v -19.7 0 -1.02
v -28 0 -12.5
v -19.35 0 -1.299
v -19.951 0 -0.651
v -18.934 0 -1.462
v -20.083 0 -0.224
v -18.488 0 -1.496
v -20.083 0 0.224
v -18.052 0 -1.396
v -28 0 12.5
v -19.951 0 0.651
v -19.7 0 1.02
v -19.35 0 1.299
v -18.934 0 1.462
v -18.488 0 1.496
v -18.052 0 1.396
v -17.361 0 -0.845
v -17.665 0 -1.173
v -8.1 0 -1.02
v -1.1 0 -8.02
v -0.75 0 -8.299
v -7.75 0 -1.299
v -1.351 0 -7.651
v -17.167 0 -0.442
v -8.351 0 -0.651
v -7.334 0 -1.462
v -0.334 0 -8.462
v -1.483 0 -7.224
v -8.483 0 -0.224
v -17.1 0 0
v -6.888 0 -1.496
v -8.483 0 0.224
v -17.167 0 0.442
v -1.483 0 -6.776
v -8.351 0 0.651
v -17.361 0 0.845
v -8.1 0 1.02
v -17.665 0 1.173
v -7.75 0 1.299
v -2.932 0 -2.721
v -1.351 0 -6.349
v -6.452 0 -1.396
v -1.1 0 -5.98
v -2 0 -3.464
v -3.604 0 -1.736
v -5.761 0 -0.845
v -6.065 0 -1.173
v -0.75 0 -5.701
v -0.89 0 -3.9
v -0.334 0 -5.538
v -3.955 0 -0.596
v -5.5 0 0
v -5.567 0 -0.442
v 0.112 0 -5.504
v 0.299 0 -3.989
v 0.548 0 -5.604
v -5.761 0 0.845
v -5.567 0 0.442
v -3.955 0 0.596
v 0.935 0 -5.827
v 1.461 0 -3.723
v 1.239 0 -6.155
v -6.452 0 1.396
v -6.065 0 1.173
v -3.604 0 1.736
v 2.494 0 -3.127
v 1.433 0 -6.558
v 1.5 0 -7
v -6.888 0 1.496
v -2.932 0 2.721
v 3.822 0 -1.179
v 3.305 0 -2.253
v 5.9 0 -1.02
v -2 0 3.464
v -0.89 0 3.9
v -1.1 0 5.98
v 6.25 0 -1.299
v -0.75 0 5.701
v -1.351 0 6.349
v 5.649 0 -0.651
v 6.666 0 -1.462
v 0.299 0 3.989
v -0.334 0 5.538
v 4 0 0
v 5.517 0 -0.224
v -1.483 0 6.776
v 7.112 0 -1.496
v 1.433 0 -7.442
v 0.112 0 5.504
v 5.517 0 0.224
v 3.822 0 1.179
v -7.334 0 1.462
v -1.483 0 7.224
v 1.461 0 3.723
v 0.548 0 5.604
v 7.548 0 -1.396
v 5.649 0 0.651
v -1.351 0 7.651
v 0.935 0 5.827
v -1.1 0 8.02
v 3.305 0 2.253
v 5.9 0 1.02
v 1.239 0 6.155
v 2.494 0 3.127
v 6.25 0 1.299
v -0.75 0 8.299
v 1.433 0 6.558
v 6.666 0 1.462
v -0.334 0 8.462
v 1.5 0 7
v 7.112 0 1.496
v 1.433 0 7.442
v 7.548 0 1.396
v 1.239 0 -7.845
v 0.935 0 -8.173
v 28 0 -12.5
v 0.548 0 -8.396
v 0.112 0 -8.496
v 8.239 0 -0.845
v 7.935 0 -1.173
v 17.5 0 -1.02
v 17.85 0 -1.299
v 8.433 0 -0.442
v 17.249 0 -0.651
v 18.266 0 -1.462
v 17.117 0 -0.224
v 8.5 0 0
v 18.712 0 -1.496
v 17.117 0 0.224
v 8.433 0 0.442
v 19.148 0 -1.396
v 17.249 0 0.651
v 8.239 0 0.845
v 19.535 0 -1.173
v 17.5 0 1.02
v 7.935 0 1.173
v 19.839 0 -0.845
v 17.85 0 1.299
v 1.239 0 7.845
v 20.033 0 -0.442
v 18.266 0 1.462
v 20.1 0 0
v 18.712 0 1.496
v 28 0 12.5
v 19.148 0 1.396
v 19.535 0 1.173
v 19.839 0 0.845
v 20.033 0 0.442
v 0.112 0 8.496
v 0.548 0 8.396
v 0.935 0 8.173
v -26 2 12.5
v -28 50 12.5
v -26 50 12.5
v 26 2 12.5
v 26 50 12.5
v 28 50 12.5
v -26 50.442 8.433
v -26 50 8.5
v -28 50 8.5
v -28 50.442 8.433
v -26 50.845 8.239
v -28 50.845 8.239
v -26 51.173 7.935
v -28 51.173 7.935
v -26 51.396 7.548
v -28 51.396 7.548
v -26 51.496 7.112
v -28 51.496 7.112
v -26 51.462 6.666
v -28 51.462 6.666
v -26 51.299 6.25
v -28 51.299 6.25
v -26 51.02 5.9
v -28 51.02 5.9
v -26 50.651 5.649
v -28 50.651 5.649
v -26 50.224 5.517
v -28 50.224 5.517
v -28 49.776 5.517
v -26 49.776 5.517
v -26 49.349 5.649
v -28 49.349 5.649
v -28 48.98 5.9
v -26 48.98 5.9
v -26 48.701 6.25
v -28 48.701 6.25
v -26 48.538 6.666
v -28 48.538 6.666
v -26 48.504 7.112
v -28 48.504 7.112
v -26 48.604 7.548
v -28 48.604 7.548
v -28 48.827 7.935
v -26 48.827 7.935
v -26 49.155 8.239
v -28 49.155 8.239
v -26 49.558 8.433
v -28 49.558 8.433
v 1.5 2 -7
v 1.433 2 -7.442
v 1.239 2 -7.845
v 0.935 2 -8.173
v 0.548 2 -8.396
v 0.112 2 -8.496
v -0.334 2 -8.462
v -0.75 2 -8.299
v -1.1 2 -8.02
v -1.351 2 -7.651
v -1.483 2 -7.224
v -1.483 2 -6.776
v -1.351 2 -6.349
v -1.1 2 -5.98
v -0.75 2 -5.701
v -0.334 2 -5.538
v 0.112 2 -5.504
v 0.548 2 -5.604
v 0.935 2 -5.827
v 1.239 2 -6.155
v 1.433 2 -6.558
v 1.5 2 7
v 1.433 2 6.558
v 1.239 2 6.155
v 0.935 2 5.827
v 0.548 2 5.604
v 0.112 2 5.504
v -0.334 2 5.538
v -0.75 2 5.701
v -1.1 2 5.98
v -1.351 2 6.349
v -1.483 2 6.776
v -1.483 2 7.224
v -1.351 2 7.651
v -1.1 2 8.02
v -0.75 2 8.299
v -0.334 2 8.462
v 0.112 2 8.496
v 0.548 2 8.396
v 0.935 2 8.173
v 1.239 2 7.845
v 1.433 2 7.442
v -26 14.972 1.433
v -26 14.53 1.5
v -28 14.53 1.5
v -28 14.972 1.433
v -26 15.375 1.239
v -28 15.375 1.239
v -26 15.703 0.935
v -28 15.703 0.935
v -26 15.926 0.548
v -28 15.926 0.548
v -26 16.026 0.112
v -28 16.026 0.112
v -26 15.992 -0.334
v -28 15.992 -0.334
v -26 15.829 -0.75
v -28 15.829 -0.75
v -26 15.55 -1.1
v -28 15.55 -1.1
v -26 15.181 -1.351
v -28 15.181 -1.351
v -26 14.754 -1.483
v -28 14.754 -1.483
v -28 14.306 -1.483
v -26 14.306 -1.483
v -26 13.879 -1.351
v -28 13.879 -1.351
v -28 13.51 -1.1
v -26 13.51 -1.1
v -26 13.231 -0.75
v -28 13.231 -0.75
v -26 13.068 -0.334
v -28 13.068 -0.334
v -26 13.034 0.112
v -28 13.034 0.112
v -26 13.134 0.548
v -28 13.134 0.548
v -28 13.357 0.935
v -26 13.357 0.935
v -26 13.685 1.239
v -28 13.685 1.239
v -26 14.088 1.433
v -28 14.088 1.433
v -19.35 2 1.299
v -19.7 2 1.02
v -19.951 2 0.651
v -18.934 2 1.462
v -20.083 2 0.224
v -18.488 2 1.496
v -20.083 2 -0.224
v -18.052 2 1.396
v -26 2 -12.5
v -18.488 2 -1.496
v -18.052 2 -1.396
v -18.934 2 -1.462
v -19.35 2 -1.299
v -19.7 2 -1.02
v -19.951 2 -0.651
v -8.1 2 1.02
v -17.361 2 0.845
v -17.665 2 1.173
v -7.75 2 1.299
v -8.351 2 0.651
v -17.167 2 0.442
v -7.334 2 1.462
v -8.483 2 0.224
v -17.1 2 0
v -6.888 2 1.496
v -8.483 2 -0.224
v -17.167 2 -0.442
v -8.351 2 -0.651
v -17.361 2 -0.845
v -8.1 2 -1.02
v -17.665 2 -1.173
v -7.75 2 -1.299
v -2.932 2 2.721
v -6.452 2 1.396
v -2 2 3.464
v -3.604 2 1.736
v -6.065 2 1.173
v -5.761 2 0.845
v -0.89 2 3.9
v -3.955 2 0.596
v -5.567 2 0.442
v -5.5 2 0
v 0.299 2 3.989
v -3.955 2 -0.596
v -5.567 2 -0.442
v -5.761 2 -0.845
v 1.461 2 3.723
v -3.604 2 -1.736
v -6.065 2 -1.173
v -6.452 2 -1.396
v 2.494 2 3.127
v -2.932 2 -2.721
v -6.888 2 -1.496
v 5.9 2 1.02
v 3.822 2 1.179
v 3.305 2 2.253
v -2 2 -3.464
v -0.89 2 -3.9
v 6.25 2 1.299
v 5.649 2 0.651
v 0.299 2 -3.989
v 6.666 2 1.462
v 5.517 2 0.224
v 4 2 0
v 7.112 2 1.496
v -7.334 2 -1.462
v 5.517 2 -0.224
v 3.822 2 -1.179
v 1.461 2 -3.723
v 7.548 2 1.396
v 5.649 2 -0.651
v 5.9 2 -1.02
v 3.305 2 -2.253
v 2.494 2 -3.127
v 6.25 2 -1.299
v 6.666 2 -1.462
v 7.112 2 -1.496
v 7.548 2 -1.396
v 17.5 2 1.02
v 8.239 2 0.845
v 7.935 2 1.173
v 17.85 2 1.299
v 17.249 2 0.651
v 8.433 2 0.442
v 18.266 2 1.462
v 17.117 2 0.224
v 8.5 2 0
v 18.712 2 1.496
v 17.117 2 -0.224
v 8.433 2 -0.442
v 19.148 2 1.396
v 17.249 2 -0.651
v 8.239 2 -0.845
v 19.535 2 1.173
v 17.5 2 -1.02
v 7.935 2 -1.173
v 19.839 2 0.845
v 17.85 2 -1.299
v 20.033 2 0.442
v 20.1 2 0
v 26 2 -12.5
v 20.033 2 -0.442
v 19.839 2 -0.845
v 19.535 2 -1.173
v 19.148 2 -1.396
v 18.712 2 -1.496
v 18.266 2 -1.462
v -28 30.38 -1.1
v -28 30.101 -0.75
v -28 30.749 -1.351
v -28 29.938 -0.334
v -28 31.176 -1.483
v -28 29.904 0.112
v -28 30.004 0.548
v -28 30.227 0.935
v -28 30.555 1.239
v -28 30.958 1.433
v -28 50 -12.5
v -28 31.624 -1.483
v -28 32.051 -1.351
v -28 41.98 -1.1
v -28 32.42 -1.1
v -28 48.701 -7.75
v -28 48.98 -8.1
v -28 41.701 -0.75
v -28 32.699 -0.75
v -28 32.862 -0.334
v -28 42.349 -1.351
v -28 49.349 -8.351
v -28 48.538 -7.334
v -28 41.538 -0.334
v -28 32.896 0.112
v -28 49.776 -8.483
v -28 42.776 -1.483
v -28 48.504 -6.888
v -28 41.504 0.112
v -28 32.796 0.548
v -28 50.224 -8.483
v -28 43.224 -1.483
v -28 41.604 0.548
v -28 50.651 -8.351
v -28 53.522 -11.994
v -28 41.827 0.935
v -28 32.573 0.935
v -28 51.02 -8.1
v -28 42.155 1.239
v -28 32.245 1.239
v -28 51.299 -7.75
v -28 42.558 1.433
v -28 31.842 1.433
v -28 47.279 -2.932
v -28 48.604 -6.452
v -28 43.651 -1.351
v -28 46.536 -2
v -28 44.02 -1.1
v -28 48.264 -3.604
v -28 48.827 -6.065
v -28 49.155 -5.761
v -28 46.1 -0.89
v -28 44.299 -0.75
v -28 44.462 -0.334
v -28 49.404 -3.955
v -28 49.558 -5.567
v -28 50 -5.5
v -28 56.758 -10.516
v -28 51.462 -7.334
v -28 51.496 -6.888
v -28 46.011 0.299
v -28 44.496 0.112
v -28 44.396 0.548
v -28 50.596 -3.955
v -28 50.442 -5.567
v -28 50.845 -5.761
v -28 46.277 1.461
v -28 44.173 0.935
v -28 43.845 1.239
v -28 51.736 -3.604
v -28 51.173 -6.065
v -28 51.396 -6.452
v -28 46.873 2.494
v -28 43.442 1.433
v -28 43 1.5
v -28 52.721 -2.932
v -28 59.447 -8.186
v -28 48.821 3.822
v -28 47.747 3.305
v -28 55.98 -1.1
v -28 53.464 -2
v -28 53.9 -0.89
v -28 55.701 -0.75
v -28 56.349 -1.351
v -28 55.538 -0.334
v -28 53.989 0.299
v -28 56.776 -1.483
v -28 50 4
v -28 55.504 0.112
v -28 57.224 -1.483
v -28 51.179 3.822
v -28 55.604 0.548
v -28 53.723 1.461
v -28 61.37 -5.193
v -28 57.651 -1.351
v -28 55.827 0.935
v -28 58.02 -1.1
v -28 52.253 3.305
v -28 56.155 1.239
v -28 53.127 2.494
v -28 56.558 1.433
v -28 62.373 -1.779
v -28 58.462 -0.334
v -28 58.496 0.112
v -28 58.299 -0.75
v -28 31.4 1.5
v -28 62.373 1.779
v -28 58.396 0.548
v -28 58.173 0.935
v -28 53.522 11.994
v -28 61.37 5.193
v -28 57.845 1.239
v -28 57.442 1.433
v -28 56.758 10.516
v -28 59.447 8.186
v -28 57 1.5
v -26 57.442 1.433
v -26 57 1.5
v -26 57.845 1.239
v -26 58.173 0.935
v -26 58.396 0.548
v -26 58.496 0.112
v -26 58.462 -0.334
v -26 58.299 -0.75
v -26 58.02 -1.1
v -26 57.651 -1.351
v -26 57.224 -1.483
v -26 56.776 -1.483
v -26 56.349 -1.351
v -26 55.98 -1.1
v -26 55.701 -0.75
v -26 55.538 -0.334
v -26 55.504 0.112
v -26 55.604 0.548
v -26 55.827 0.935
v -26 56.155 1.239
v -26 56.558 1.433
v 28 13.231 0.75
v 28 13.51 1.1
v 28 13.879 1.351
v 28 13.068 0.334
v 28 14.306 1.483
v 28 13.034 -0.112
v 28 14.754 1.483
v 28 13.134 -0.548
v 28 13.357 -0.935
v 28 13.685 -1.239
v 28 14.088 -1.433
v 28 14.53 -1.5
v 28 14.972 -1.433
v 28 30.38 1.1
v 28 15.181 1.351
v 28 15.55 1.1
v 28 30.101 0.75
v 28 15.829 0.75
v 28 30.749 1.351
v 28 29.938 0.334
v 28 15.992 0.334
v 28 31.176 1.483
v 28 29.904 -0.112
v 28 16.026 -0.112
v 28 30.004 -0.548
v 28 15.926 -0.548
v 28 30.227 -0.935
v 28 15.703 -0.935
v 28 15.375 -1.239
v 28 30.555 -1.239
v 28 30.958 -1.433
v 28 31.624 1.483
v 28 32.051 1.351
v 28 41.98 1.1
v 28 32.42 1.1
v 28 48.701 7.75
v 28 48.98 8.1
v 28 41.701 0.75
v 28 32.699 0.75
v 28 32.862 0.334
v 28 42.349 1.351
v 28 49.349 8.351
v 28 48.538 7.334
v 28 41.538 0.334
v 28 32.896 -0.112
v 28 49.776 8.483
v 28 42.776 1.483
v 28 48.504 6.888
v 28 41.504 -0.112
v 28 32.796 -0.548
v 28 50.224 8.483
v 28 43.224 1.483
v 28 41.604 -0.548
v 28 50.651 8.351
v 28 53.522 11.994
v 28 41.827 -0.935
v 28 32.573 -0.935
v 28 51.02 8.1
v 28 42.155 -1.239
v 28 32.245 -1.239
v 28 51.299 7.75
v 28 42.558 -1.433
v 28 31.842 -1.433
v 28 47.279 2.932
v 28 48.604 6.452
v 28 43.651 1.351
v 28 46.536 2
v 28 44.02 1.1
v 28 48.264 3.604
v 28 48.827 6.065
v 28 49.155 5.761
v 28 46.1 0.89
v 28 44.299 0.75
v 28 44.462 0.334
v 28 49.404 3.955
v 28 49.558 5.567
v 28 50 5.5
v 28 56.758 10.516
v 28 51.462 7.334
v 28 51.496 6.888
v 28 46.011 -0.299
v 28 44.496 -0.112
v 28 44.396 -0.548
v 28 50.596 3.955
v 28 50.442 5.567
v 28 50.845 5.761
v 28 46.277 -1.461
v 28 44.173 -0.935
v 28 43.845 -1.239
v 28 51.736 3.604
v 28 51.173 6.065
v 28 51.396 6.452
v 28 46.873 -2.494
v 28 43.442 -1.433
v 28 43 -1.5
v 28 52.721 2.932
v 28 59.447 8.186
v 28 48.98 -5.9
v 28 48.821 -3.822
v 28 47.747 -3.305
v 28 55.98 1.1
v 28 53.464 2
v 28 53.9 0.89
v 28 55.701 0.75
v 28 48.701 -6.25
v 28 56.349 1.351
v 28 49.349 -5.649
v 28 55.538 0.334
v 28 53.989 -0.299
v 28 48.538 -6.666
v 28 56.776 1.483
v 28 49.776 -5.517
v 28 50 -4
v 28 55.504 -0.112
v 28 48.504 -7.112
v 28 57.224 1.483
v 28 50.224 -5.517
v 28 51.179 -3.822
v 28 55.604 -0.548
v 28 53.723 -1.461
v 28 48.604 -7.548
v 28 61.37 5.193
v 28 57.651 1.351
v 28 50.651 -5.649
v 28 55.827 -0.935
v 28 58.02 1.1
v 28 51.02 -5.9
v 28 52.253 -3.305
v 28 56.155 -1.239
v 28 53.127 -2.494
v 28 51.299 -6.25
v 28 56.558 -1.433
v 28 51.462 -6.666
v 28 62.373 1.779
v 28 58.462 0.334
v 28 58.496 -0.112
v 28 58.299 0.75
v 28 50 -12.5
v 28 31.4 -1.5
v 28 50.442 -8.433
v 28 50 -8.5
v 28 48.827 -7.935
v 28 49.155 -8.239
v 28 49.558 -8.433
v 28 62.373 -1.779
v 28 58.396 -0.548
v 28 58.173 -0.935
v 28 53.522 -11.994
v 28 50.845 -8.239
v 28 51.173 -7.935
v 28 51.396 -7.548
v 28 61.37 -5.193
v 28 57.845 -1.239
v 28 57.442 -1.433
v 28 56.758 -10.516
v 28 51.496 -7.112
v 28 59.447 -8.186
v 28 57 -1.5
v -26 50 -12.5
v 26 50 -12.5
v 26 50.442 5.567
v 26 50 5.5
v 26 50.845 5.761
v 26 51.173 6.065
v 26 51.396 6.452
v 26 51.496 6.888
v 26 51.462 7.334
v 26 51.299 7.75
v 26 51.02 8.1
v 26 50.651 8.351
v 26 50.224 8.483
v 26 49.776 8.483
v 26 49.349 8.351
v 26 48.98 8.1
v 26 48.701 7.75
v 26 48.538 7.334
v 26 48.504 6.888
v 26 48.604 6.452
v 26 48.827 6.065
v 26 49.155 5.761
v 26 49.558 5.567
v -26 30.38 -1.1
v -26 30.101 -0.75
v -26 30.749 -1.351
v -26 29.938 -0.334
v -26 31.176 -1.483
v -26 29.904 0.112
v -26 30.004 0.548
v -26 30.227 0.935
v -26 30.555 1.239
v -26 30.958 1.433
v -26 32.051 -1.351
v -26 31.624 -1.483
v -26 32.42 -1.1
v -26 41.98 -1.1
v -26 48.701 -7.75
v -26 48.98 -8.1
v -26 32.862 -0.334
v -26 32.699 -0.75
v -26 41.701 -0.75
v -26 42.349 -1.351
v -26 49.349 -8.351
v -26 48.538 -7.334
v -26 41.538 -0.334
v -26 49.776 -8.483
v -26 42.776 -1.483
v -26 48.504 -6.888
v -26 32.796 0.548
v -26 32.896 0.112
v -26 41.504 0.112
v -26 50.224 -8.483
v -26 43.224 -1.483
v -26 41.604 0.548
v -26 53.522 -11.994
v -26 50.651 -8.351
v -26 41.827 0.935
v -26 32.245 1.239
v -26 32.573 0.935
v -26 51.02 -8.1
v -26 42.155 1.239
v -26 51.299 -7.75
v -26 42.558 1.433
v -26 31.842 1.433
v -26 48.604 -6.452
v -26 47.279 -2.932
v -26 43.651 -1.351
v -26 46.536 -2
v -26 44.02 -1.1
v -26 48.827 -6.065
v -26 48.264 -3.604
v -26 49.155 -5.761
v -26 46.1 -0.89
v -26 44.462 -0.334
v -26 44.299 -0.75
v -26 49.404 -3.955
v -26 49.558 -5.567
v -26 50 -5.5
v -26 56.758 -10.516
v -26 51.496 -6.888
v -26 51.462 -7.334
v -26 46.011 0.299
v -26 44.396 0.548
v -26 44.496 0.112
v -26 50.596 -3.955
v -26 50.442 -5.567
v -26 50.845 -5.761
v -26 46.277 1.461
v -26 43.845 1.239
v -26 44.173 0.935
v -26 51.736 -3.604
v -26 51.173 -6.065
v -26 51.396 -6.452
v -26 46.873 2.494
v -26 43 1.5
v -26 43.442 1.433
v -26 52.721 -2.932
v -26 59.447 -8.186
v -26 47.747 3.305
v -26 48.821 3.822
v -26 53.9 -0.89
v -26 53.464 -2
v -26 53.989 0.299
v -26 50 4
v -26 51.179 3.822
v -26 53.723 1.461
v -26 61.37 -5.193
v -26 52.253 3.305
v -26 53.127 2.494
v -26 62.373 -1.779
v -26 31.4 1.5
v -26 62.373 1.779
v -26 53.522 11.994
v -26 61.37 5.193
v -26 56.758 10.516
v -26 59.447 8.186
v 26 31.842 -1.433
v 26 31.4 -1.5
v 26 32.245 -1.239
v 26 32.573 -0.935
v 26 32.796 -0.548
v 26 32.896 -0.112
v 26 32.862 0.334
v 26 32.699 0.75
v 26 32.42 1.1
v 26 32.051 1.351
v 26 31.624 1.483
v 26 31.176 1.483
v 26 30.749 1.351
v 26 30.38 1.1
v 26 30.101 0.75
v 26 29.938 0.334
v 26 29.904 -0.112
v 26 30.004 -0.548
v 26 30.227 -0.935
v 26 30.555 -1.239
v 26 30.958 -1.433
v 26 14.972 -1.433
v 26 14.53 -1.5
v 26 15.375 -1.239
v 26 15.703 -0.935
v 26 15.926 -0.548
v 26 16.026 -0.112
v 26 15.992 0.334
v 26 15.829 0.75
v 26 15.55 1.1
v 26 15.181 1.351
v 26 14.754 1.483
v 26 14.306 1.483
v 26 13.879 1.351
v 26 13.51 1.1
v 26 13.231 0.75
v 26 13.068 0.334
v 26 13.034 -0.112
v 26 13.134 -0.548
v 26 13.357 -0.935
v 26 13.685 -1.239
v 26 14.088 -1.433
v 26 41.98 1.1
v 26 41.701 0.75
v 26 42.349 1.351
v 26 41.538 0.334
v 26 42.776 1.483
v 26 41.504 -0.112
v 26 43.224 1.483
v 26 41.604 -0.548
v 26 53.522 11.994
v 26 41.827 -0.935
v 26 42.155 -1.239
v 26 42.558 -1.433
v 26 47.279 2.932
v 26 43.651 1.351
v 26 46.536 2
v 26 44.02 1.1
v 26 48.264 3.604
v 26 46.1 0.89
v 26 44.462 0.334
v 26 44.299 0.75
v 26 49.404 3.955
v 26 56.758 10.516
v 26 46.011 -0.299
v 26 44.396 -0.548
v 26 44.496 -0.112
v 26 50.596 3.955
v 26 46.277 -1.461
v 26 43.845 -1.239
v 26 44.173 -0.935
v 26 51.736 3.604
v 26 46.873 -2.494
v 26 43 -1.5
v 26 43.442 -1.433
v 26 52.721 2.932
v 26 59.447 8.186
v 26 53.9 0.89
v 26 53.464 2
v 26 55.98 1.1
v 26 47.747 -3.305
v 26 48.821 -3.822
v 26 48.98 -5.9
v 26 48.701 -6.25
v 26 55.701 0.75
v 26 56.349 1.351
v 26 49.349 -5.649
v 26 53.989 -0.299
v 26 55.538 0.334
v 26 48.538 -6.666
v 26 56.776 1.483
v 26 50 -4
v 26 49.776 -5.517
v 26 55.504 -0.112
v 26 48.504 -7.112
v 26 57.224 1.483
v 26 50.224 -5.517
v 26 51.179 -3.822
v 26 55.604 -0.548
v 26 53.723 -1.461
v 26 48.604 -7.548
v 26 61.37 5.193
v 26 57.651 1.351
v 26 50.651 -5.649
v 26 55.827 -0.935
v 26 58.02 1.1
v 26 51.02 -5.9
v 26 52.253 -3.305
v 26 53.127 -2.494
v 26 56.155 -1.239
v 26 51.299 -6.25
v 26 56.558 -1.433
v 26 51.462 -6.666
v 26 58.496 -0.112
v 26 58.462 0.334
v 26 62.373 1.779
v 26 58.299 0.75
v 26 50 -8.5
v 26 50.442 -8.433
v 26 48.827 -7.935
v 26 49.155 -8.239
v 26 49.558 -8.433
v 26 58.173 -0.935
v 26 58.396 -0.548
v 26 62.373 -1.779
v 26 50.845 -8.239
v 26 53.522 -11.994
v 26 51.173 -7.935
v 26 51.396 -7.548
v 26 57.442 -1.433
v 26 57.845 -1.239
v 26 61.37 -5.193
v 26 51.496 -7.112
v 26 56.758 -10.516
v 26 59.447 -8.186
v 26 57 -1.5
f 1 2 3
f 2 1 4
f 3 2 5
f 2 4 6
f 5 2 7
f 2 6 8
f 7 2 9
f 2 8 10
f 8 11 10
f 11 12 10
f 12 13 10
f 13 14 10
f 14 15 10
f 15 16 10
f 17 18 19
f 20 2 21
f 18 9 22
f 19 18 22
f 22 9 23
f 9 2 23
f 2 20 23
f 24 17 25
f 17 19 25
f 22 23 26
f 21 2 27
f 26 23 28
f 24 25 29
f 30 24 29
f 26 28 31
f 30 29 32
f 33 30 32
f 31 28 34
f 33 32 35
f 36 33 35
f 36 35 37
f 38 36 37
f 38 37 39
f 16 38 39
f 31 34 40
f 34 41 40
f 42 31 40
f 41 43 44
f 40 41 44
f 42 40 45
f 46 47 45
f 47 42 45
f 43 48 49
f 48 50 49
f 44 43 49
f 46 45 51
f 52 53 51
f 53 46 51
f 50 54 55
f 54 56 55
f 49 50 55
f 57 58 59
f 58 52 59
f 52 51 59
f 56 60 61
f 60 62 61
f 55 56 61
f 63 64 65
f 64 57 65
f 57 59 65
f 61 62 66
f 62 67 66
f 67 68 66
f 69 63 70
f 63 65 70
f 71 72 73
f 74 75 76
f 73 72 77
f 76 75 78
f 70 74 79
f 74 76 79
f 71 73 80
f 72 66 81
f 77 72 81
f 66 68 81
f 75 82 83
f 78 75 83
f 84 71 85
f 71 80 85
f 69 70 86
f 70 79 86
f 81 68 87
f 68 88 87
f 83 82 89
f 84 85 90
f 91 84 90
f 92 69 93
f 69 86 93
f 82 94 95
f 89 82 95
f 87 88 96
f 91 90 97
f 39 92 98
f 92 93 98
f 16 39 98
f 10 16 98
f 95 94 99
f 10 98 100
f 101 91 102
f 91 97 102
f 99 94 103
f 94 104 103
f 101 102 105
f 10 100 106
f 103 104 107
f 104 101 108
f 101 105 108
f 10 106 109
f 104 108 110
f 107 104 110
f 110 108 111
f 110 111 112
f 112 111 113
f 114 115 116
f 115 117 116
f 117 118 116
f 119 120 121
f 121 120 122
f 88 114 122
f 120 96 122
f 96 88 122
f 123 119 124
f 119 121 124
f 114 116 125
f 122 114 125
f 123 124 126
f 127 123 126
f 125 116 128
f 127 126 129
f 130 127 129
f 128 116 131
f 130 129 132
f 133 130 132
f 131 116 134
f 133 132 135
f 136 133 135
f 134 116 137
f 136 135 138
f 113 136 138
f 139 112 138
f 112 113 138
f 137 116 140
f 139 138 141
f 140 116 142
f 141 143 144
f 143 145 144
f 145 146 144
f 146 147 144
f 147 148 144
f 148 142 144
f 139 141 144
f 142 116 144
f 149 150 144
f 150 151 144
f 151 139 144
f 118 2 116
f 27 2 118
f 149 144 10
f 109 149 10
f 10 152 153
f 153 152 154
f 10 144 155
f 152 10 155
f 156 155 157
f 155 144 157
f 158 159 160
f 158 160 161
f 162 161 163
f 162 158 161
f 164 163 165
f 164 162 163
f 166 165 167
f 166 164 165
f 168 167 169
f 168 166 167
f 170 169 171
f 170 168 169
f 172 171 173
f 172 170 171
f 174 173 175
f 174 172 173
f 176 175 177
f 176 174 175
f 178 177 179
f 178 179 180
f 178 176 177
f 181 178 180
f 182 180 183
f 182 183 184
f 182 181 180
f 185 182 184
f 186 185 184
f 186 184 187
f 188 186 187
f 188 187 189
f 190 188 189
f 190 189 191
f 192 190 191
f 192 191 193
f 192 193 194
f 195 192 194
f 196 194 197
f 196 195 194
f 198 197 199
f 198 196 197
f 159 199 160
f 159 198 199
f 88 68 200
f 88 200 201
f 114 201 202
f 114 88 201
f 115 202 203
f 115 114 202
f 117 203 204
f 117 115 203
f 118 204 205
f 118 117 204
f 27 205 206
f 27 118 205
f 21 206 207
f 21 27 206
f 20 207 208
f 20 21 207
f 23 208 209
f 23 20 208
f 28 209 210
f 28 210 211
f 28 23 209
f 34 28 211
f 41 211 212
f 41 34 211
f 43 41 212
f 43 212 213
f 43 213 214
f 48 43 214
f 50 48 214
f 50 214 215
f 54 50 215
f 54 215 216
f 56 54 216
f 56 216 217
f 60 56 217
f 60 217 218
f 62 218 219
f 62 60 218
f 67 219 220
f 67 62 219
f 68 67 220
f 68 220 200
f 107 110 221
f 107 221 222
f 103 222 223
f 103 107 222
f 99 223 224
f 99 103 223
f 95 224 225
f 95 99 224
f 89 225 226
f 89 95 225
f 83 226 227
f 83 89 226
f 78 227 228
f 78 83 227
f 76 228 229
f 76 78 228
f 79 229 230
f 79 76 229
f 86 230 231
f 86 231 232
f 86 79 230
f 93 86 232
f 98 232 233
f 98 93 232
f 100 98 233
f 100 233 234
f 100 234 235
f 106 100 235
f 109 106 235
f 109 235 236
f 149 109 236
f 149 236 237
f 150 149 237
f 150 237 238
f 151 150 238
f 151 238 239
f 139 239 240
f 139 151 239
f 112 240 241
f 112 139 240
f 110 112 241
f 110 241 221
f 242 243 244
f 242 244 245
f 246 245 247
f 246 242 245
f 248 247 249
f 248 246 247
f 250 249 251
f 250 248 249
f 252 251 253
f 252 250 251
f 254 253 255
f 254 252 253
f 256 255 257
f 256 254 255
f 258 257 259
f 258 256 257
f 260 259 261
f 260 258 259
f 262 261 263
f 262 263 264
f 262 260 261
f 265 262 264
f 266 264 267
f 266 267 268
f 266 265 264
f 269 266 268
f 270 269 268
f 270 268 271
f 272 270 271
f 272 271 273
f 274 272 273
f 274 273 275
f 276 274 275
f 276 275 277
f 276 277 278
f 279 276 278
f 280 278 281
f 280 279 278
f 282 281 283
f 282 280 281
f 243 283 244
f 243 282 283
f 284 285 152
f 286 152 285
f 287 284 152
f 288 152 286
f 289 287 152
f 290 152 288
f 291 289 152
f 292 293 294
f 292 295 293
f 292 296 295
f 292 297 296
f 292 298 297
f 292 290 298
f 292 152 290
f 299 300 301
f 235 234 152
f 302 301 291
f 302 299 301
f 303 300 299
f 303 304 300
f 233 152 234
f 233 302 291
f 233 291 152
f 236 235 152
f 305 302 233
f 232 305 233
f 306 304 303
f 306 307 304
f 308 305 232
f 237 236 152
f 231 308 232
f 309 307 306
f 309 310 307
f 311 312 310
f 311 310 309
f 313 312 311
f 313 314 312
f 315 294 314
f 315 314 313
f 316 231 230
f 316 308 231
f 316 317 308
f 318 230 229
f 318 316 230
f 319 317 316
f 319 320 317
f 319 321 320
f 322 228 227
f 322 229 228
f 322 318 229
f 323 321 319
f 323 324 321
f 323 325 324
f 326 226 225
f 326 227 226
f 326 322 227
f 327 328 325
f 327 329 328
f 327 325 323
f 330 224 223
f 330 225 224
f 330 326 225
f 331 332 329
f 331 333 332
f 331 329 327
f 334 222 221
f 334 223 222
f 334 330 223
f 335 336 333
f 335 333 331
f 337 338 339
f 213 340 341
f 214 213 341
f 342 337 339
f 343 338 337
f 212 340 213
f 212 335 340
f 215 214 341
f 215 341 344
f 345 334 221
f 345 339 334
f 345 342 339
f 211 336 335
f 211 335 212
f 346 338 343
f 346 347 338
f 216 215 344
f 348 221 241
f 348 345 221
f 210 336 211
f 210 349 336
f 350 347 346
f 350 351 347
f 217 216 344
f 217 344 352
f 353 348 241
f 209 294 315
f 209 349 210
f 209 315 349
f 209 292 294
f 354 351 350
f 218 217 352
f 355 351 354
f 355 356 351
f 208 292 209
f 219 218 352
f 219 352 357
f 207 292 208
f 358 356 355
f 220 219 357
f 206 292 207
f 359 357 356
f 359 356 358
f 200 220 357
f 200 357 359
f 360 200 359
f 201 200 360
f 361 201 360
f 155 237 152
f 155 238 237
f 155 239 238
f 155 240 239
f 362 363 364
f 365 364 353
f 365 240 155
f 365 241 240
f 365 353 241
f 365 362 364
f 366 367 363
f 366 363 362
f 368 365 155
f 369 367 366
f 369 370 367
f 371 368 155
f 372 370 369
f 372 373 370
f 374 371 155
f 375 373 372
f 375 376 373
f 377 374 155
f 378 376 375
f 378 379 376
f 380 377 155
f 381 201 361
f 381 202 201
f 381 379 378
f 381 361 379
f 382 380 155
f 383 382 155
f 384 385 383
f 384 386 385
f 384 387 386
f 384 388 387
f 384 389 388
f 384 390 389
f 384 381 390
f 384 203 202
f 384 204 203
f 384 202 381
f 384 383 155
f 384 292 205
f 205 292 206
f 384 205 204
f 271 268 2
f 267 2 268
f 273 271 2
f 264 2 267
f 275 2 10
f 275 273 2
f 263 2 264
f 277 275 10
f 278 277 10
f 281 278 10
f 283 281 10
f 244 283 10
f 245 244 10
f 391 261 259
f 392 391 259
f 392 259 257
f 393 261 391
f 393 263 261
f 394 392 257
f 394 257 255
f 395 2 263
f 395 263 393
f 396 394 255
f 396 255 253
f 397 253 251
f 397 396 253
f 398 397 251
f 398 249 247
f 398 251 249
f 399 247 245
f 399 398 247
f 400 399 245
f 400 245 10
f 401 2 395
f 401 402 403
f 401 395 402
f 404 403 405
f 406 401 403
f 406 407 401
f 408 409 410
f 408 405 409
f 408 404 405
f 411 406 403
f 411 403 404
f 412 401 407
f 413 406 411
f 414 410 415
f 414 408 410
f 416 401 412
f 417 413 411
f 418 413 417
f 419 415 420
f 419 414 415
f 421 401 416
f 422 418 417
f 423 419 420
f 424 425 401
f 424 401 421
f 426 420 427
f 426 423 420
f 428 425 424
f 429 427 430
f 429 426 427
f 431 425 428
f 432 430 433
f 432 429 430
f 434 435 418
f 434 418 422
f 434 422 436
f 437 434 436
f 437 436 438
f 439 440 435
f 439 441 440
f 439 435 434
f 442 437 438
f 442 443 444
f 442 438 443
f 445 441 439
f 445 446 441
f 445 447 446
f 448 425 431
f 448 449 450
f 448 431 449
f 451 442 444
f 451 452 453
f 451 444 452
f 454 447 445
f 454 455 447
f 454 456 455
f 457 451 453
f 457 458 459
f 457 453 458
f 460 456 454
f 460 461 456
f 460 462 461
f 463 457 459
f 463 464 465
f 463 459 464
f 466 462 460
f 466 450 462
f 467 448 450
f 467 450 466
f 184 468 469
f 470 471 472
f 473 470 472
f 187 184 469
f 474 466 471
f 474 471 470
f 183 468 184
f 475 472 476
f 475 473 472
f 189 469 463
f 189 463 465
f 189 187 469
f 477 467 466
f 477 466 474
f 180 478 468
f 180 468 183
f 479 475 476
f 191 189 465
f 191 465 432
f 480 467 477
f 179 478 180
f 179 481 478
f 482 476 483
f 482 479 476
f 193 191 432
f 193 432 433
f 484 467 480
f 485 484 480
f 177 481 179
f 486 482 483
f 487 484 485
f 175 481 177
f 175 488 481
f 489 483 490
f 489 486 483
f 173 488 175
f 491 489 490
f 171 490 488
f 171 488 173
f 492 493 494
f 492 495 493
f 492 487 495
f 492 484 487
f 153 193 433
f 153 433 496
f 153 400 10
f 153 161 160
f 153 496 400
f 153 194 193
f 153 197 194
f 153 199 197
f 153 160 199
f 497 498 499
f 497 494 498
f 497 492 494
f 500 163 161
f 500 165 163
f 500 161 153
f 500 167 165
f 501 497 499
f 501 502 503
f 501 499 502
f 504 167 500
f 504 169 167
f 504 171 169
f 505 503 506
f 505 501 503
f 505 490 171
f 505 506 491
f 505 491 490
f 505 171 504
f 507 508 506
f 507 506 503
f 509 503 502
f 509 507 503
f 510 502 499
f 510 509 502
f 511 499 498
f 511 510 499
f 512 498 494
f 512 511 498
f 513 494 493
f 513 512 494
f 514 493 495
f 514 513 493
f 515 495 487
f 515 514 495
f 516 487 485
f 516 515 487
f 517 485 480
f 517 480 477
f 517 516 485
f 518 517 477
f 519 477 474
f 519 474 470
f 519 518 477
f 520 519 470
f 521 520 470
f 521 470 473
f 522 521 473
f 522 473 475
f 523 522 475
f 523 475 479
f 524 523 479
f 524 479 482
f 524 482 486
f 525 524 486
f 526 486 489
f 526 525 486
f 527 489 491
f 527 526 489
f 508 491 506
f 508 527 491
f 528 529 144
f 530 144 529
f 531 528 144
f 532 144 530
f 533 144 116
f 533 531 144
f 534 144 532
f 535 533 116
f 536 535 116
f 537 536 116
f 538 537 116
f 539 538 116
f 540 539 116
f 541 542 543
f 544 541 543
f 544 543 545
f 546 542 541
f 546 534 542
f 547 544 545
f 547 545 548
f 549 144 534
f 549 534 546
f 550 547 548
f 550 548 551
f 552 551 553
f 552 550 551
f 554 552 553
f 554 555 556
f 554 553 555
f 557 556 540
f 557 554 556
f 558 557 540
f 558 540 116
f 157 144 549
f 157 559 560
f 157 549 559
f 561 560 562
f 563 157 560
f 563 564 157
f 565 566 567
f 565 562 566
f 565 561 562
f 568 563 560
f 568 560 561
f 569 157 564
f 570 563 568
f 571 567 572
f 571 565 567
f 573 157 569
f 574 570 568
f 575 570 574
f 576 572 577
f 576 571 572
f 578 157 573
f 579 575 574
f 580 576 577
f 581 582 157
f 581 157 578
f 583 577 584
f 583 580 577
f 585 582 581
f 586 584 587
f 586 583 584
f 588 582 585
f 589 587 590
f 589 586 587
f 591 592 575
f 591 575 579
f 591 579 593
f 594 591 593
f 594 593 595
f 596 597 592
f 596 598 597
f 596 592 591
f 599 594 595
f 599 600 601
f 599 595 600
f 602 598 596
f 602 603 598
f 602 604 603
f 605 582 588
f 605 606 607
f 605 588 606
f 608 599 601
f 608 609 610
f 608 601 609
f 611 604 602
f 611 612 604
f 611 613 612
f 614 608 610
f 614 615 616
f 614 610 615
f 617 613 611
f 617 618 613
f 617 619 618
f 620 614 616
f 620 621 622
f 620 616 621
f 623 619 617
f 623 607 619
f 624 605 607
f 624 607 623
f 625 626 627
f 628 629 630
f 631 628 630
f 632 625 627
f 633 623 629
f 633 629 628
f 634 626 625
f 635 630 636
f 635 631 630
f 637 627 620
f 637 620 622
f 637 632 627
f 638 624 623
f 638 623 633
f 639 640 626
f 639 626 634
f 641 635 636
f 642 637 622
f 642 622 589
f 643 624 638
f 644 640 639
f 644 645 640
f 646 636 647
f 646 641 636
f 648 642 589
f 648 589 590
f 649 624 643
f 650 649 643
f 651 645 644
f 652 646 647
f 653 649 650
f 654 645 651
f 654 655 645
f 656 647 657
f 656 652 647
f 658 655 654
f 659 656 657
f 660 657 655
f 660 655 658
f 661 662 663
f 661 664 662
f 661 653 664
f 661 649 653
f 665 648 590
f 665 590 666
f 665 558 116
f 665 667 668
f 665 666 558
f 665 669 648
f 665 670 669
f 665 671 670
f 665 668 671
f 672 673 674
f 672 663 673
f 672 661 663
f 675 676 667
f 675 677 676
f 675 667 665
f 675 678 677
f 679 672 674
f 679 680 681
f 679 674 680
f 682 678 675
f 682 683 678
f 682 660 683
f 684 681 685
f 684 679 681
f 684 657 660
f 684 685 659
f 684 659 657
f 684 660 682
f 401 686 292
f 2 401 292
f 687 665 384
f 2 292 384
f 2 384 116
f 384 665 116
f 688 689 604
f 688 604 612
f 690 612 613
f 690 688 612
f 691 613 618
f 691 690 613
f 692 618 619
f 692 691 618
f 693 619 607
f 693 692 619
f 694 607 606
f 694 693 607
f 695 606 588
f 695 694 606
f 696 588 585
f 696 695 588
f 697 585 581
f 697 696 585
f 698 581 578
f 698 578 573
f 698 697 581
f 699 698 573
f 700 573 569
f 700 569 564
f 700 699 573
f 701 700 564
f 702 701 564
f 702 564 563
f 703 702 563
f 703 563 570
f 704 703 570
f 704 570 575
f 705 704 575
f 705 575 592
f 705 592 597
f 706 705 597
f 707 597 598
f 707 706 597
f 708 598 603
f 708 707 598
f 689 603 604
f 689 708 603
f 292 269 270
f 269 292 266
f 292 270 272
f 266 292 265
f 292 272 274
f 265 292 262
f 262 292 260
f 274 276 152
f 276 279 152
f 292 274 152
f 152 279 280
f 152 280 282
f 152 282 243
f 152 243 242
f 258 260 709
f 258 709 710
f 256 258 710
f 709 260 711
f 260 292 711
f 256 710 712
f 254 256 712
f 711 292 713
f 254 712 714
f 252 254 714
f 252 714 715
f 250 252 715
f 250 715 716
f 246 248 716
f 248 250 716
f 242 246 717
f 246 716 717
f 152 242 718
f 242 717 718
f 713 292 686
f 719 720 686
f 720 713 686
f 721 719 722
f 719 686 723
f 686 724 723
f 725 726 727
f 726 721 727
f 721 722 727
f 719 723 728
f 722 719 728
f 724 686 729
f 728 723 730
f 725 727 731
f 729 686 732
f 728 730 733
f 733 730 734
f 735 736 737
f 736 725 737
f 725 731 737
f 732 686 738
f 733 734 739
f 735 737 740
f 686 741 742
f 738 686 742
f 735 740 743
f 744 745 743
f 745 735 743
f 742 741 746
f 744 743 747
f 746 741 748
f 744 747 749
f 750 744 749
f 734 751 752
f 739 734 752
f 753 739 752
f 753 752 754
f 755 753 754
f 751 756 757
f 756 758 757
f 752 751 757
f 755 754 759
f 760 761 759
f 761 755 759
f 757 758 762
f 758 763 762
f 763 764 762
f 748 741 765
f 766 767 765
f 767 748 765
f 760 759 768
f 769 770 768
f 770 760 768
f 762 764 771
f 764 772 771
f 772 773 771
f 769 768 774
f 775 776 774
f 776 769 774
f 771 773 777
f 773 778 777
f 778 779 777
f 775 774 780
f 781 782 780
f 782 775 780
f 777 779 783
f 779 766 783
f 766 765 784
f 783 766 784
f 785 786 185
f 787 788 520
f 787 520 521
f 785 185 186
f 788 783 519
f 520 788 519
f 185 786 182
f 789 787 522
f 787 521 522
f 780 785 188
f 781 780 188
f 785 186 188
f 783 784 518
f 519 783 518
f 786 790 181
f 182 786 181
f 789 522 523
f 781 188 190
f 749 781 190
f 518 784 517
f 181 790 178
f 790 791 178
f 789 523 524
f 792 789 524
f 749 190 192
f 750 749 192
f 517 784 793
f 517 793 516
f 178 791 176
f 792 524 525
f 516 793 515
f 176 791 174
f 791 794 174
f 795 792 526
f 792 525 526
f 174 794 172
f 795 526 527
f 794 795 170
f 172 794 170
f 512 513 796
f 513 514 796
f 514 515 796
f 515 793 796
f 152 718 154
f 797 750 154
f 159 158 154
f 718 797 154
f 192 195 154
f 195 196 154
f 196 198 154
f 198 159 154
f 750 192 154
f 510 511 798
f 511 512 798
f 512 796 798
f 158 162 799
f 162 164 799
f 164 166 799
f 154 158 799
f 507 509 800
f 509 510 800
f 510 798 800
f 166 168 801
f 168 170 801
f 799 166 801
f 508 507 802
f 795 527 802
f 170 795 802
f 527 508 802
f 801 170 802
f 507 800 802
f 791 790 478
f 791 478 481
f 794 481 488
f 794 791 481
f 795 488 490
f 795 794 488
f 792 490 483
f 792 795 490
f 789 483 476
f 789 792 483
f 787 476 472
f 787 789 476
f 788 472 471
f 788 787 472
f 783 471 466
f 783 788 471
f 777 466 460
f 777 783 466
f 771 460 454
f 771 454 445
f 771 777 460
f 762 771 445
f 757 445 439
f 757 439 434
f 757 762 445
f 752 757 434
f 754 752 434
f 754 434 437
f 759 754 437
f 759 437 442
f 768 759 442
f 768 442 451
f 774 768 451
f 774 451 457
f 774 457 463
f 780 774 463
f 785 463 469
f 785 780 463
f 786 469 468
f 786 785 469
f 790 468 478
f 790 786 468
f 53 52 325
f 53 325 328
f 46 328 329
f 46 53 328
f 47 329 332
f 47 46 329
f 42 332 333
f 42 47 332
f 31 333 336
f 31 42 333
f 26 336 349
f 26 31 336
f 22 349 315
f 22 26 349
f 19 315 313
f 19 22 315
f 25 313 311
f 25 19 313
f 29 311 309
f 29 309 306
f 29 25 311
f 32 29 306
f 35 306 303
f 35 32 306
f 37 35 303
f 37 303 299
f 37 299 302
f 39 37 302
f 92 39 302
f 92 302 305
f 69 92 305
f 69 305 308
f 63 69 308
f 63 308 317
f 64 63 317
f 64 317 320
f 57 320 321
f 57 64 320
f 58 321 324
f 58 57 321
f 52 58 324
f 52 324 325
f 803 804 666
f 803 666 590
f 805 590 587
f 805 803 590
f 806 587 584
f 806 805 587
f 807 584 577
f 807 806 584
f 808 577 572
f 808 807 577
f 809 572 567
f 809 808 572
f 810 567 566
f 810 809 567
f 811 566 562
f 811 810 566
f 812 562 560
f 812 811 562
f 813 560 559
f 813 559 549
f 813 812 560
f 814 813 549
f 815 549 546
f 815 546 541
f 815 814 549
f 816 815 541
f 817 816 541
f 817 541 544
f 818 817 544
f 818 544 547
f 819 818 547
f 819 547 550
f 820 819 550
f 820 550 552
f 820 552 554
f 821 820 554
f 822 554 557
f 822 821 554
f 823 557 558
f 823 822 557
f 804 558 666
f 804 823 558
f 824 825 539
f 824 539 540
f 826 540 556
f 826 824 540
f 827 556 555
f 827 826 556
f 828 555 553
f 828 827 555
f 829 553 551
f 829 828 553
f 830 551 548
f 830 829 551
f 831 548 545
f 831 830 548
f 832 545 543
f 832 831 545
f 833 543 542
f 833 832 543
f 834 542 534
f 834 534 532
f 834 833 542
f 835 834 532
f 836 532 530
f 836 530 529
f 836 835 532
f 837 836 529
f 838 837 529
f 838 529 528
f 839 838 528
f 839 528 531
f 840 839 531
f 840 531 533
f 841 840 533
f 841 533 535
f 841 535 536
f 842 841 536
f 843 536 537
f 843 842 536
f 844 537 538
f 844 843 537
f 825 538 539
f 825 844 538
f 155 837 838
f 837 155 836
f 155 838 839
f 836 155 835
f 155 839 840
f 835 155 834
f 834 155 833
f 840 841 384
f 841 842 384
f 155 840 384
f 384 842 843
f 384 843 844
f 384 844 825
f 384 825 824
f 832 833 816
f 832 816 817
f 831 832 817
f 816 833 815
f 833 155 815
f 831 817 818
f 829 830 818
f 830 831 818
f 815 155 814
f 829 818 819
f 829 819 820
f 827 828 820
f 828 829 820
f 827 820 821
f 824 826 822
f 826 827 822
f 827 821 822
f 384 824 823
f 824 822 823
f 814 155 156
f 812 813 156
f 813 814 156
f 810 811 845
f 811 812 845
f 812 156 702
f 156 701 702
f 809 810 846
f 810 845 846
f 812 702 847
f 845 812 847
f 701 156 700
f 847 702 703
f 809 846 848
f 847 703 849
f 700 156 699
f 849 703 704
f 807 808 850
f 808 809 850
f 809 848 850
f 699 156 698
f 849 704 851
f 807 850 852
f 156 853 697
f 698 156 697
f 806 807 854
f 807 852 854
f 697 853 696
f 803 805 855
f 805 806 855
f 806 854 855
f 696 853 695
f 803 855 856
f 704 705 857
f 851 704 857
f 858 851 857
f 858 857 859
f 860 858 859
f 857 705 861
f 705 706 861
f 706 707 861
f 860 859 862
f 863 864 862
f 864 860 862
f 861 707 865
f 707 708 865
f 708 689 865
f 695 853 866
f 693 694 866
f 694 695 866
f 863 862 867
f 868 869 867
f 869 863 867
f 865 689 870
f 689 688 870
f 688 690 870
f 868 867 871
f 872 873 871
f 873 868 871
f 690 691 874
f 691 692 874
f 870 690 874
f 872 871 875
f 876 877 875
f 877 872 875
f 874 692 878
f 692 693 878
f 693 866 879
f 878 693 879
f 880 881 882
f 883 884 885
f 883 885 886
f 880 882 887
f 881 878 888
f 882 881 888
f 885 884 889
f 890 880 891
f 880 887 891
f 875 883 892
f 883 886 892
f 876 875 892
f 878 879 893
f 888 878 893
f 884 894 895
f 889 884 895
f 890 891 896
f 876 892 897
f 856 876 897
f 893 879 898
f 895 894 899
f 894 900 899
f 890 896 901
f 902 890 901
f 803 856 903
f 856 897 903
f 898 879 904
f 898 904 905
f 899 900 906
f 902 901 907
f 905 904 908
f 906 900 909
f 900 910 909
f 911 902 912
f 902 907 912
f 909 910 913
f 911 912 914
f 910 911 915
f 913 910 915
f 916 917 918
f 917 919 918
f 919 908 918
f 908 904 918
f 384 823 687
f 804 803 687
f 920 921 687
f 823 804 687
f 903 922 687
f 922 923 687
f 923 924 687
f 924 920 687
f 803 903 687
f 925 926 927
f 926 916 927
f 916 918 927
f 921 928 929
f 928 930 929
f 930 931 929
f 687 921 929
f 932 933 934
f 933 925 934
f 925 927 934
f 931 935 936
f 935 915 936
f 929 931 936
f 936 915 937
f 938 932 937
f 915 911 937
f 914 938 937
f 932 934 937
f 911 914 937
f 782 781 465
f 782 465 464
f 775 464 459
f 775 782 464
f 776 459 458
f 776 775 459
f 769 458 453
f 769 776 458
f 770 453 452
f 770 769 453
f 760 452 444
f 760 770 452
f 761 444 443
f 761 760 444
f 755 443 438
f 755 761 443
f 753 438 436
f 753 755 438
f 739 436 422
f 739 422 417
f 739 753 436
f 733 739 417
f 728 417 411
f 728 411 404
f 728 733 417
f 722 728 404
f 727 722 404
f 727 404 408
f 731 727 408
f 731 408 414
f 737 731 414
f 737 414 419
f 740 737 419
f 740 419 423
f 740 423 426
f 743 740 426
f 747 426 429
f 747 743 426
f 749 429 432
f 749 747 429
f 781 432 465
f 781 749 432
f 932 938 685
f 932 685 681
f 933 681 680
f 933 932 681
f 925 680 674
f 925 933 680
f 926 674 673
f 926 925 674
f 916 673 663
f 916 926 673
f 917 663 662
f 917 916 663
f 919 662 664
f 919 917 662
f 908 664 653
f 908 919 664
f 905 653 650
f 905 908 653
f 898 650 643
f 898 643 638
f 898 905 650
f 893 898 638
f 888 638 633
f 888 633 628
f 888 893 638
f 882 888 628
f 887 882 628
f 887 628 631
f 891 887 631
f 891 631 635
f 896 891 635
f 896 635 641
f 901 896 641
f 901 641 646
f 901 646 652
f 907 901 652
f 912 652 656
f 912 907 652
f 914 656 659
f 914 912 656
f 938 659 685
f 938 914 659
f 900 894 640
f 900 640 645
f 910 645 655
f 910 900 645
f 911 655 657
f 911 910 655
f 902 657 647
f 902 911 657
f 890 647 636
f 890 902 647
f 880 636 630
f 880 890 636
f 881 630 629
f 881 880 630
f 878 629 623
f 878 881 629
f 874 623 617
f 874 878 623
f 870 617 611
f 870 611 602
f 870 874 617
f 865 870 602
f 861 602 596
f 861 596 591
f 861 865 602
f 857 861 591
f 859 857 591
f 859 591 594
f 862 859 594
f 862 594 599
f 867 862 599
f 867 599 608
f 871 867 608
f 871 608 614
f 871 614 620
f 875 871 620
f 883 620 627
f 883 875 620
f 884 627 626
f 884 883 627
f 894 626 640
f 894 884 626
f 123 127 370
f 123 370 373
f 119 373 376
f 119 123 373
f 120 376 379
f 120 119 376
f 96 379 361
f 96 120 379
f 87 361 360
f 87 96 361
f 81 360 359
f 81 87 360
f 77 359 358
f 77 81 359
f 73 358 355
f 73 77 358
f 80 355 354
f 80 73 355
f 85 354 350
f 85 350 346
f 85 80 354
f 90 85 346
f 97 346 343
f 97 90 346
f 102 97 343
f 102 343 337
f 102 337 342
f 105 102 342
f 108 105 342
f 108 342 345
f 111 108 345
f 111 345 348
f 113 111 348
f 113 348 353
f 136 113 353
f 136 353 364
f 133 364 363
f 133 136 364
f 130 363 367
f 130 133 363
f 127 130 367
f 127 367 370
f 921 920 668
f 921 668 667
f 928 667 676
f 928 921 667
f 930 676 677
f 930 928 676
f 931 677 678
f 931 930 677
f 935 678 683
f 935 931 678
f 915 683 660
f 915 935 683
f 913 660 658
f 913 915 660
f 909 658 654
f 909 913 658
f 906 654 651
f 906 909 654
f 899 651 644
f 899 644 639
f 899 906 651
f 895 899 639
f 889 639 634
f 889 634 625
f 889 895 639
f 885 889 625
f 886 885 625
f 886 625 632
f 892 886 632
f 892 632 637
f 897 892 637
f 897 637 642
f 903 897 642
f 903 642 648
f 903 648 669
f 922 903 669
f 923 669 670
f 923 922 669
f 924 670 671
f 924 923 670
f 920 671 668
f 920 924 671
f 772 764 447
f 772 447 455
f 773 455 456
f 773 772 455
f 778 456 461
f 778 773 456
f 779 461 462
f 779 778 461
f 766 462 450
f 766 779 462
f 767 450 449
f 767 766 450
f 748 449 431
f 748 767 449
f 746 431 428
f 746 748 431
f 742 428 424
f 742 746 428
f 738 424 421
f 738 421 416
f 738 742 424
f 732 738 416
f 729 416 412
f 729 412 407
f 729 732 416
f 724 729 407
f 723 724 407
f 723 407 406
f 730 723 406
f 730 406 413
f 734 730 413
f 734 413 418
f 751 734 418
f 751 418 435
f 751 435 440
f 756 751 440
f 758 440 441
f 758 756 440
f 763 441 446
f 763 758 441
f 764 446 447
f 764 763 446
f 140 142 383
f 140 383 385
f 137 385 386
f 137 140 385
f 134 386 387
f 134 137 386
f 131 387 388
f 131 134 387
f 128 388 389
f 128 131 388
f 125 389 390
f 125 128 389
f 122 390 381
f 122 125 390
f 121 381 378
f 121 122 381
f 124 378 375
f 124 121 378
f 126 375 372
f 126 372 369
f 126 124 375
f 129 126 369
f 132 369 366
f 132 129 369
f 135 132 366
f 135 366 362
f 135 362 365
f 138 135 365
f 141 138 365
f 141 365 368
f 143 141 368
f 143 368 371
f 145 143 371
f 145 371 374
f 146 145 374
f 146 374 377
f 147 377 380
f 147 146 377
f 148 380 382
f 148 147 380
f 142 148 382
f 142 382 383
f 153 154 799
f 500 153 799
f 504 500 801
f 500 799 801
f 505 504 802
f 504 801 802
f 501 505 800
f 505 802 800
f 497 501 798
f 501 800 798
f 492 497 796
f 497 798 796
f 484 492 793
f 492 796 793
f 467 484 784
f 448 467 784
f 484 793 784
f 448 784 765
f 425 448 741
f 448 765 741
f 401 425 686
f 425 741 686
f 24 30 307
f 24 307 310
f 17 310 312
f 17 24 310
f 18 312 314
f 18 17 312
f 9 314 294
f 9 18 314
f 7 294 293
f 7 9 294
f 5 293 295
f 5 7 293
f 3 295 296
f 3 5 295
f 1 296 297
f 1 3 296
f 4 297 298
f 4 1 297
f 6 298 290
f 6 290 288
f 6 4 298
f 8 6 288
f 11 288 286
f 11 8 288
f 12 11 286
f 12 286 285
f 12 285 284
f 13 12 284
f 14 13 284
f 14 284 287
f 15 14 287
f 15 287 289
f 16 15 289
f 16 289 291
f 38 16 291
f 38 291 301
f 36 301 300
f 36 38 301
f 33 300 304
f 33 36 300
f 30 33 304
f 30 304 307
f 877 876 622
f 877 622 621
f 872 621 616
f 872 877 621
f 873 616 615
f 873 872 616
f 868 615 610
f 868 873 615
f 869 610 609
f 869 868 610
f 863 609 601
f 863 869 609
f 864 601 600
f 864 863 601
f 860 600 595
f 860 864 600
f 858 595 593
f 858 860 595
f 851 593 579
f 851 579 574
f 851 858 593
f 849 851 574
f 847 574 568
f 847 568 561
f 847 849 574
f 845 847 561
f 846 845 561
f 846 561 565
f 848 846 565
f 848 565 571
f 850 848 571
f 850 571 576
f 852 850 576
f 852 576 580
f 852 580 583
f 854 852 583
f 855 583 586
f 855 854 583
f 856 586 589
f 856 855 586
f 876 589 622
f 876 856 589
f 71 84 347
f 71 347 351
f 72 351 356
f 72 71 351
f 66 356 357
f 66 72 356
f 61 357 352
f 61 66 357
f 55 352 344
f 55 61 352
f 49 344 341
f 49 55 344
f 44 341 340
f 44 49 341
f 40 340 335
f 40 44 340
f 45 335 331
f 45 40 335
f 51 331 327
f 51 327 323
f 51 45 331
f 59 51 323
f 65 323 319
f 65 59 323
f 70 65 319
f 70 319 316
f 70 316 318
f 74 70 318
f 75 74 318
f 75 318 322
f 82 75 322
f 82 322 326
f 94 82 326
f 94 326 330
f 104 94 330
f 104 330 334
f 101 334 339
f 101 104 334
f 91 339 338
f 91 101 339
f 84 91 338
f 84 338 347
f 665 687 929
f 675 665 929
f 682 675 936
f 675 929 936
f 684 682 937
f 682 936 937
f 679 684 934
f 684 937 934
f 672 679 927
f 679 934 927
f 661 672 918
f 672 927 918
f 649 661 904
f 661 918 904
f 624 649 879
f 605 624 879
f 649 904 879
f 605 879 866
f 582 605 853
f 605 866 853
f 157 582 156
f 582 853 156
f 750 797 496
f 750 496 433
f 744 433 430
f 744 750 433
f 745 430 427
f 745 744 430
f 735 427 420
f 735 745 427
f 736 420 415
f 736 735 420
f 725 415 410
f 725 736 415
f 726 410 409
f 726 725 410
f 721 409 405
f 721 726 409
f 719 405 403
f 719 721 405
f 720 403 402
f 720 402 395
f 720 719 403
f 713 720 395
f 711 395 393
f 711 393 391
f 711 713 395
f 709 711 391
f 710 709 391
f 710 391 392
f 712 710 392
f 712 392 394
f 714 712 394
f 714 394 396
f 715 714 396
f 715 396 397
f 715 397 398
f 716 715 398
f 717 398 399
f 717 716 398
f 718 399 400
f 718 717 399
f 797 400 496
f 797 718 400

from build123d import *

# Parameters (mm, degrees)
SKETCH1_W           = 52
SKETCH1_H           = 25
SKETCH1_R           = 4
SKETCH1_R_2         = 1.5
BOSS_EXTRUDE1_DEPTH = 2
SKETCH3_R           = 4
SKETCH3_R_2         = 1.5
BOSS_EXTRUDE2_DEPTH = 2
SKETCH4_R           = 4
SKETCH4_R_2         = 1.5
BOSS_EXTRUDE3_DEPTH = 2


with BuildPart() as part:
    # Sketch1 → Boss-Extrude1 (new body)
    with BuildSketch(Plane(origin=(0, 0, 0), x_dir=(1, 0, 0), z_dir=(0, 1, 0))):
        Rectangle(SKETCH1_W, SKETCH1_H)
        Circle(SKETCH1_R, mode=Mode.SUBTRACT)
        with Locations((18.6, 0)):
            Circle(SKETCH1_R_2, mode=Mode.SUBTRACT)
        with Locations((0, 7)):
            Circle(SKETCH1_R_2, mode=Mode.SUBTRACT)
        with Locations((7, 0)):
            Circle(SKETCH1_R_2, mode=Mode.SUBTRACT)
        with Locations((0, -7)):
            Circle(SKETCH1_R_2, mode=Mode.SUBTRACT)
        with Locations((-7, 0)):
            Circle(SKETCH1_R_2, mode=Mode.SUBTRACT)
        with Locations((-18.6, 0)):
            Circle(SKETCH1_R_2, mode=Mode.SUBTRACT)
    extrude(amount=BOSS_EXTRUDE1_DEPTH)

    # Sketch3 → Boss-Extrude2 (add)
    with BuildSketch(Plane(origin=(26, 0, 0), x_dir=(0, 0, -1), z_dir=(1, 0, 0))):
        with BuildLine():
            Line((-12.5, 0), (12.5, 0))
            Line((12.5, 0), (12.5, 50))
            ThreePointArc((12.5, 50), (0, 62.5), (-12.5, 50))
            Line((-12.5, 50), (-12.5, 0))
        make_face()
        with Locations((0, 50)):
            Circle(SKETCH3_R, mode=Mode.SUBTRACT)
        with Locations((0, 43)):
            Circle(SKETCH3_R_2, mode=Mode.SUBTRACT)
        with Locations((7, 50)):
            Circle(SKETCH3_R_2, mode=Mode.SUBTRACT)
        with Locations((0, 57)):
            Circle(SKETCH3_R_2, mode=Mode.SUBTRACT)
        with Locations((-7, 50)):
            Circle(SKETCH3_R_2, mode=Mode.SUBTRACT)
        with Locations((0, 31.4)):
            Circle(SKETCH3_R_2, mode=Mode.SUBTRACT)
        with Locations((0, 14.53)):
            Circle(SKETCH3_R_2, mode=Mode.SUBTRACT)
    extrude(amount=BOSS_EXTRUDE2_DEPTH)

    # Sketch4 → Boss-Extrude3 (add)
    with BuildSketch(Plane.ZY.offset(26)):
        with BuildLine():
            Line((-12.5, 0), (12.5, 0))
            Line((12.5, 0), (12.5, 50))
            ThreePointArc((12.5, 50), (0, 62.5), (-12.5, 50))
            Line((-12.5, 50), (-12.5, 0))
        make_face()
        with Locations((0, 50)):
            Circle(SKETCH4_R, mode=Mode.SUBTRACT)
        with Locations((0, 57)):
            Circle(SKETCH4_R_2, mode=Mode.SUBTRACT)
        with Locations((7, 50)):
            Circle(SKETCH4_R_2, mode=Mode.SUBTRACT)
        with Locations((-7, 50)):
            Circle(SKETCH4_R_2, mode=Mode.SUBTRACT)
        with Locations((0, 43)):
            Circle(SKETCH4_R_2, mode=Mode.SUBTRACT)
        with Locations((0, 31.4)):
            Circle(SKETCH4_R_2, mode=Mode.SUBTRACT)
        with Locations((0, 14.53)):
            Circle(SKETCH4_R_2, mode=Mode.SUBTRACT)
    extrude(amount=BOSS_EXTRUDE3_DEPTH)


solid = part.part
